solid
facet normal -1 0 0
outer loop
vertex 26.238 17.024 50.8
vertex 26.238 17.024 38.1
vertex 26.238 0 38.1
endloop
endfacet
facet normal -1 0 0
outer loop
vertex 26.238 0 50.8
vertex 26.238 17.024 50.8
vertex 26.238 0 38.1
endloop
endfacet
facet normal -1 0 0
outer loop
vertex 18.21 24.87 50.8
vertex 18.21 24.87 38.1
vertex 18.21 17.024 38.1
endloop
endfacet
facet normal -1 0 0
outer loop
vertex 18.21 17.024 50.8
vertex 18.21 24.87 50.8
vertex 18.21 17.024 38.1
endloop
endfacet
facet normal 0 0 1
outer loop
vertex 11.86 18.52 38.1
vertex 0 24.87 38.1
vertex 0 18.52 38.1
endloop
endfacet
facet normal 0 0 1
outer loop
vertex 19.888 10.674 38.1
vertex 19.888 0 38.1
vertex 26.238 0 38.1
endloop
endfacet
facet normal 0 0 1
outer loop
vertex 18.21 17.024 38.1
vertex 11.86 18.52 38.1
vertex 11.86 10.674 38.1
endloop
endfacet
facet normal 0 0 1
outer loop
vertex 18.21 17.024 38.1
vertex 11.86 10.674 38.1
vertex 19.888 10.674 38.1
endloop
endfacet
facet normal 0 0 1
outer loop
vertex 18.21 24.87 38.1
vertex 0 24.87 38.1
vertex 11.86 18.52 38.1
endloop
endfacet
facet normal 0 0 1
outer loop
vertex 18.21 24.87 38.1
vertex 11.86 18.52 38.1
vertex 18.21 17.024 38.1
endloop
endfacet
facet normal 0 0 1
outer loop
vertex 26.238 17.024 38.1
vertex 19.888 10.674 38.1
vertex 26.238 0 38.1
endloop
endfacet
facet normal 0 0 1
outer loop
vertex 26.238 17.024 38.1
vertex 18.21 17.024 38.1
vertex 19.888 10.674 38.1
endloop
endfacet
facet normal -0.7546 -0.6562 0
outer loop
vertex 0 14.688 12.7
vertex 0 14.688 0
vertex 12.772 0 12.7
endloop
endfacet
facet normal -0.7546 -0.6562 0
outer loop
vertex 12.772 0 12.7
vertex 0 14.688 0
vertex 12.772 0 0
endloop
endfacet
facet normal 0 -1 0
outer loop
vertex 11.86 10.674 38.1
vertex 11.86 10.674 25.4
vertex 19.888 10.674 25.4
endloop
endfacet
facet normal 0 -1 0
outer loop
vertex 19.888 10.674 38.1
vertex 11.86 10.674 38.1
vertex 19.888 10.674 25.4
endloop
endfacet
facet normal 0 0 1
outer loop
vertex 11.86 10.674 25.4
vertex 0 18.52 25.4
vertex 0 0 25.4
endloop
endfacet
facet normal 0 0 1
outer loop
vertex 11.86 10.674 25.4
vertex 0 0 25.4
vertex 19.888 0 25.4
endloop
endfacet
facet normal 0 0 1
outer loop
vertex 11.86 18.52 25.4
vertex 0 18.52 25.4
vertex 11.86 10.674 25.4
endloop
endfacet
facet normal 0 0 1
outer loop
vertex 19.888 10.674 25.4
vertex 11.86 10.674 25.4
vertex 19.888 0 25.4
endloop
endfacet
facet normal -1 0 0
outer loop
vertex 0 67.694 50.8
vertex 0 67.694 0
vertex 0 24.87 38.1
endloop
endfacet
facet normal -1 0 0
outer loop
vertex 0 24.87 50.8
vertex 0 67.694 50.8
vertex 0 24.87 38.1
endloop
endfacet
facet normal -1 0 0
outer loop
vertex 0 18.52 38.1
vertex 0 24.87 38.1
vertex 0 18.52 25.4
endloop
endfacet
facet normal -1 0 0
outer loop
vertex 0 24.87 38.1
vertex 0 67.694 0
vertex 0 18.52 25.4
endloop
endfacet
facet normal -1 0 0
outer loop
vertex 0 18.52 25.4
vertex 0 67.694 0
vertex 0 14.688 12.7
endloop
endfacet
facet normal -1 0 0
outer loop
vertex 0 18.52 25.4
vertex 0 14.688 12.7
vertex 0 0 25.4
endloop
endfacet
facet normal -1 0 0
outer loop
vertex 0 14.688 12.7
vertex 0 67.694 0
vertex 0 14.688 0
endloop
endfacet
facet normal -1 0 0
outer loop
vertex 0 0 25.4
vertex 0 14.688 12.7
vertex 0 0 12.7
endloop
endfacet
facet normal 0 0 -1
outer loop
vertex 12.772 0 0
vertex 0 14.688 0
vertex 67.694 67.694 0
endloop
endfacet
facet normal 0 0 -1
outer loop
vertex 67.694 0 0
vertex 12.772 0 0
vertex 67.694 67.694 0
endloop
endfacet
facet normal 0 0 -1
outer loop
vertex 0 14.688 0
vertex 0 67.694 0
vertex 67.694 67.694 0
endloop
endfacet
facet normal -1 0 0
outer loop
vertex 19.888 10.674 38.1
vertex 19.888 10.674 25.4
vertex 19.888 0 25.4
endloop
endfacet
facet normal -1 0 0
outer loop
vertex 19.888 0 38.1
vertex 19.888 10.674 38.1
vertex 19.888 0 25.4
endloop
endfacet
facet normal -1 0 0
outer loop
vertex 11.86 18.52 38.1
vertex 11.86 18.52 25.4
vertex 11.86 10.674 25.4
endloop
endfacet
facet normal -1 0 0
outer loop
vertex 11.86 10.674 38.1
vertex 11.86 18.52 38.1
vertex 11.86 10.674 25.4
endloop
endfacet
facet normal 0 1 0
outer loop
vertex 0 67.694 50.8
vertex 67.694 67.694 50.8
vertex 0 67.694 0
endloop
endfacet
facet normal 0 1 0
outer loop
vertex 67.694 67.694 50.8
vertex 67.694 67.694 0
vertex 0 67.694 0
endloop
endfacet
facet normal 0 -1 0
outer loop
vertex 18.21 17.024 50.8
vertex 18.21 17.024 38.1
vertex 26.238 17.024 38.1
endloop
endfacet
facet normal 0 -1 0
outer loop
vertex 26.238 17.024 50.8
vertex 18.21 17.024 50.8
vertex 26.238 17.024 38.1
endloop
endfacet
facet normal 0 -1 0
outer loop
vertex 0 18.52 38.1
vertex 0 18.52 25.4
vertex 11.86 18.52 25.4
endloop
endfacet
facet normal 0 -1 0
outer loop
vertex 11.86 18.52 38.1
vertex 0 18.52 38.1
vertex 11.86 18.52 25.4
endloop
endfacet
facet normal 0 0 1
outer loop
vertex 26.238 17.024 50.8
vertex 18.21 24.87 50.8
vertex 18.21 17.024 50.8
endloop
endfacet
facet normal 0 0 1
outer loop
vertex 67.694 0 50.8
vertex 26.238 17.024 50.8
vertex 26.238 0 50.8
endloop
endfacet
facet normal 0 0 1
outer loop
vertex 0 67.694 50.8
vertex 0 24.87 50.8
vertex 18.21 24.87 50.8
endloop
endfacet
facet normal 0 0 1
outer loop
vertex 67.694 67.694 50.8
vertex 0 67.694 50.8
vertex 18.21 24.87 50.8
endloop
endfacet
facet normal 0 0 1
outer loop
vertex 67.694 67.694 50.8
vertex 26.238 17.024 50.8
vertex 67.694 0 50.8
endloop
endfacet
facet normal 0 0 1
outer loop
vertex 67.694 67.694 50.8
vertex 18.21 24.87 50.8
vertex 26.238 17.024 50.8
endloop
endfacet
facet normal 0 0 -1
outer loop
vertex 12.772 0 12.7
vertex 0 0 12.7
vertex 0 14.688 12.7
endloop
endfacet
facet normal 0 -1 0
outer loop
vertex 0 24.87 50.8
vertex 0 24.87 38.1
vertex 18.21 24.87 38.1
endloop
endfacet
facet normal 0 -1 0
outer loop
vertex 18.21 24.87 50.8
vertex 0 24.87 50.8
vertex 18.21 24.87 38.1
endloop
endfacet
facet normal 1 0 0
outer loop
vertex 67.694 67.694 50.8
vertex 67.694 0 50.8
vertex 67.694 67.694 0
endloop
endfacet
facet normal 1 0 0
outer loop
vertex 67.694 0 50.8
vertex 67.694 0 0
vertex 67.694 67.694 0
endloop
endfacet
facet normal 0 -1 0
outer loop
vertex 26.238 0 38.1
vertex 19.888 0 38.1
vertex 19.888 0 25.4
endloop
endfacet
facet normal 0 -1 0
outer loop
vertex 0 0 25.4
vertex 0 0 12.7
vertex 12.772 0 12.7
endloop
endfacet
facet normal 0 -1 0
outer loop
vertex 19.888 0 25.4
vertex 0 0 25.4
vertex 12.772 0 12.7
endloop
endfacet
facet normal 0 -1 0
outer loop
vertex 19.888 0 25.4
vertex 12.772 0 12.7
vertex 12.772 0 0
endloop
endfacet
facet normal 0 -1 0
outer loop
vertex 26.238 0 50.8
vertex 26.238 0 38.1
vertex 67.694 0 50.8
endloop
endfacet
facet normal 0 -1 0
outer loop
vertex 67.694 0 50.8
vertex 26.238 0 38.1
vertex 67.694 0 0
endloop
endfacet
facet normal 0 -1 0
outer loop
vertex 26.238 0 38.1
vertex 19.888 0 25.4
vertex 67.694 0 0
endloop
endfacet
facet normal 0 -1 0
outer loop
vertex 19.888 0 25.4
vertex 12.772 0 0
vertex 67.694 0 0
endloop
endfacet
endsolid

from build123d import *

# Parameters (mm, degrees)
F1_DEPTH = 12.7
F2_W     = 67.693748
F2_H     = 67.693748
F3_DEPTH = 12.7
F5_DEPTH = 12.7
F7_DEPTH = 12.7


with BuildPart() as f1:
    # F0 (on Top) → F1 (new body)
    with BuildSketch(Plane.XY):
        Polygon((0, 14.688266), (12.772406, 0), (67.693748, 0), (67.693748, 67.693748), (0, 67.693748), align=None)
    extrude(amount=F1_DEPTH)

    # F2 (on face) → F3 (join)
    with BuildSketch(Plane.XY.offset(12.7)):
        with Locations((33.846874, 33.846874)):
            Rectangle(F2_W, F2_H)
    extrude(amount=F3_DEPTH)

    # F4 (on face) → F5 (join)
    with BuildSketch(Plane.XY.offset(25.4)):
        Polygon((67.693748, 67.693748), (0, 67.693748), (0, 18.519988), (11.860092, 18.519988), (11.860092, 10.674083), (19.888459, 10.674083), (19.888459, 0), (67.693748, 0), align=None)
    extrude(amount=F5_DEPTH)

    # F6 (on face) → F7 (join)
    with BuildSketch(Plane.XY.offset(38.1)):
        Polygon((18.210092, 17.024082), (26.238458, 17.024082), (26.238458, 0), (67.693748, 0), (67.693748, 67.693748), (0, 67.693748), (0, 24.869988), (18.210092, 24.869988), align=None)
    extrude(amount=F7_DEPTH)


solid = f1.part
